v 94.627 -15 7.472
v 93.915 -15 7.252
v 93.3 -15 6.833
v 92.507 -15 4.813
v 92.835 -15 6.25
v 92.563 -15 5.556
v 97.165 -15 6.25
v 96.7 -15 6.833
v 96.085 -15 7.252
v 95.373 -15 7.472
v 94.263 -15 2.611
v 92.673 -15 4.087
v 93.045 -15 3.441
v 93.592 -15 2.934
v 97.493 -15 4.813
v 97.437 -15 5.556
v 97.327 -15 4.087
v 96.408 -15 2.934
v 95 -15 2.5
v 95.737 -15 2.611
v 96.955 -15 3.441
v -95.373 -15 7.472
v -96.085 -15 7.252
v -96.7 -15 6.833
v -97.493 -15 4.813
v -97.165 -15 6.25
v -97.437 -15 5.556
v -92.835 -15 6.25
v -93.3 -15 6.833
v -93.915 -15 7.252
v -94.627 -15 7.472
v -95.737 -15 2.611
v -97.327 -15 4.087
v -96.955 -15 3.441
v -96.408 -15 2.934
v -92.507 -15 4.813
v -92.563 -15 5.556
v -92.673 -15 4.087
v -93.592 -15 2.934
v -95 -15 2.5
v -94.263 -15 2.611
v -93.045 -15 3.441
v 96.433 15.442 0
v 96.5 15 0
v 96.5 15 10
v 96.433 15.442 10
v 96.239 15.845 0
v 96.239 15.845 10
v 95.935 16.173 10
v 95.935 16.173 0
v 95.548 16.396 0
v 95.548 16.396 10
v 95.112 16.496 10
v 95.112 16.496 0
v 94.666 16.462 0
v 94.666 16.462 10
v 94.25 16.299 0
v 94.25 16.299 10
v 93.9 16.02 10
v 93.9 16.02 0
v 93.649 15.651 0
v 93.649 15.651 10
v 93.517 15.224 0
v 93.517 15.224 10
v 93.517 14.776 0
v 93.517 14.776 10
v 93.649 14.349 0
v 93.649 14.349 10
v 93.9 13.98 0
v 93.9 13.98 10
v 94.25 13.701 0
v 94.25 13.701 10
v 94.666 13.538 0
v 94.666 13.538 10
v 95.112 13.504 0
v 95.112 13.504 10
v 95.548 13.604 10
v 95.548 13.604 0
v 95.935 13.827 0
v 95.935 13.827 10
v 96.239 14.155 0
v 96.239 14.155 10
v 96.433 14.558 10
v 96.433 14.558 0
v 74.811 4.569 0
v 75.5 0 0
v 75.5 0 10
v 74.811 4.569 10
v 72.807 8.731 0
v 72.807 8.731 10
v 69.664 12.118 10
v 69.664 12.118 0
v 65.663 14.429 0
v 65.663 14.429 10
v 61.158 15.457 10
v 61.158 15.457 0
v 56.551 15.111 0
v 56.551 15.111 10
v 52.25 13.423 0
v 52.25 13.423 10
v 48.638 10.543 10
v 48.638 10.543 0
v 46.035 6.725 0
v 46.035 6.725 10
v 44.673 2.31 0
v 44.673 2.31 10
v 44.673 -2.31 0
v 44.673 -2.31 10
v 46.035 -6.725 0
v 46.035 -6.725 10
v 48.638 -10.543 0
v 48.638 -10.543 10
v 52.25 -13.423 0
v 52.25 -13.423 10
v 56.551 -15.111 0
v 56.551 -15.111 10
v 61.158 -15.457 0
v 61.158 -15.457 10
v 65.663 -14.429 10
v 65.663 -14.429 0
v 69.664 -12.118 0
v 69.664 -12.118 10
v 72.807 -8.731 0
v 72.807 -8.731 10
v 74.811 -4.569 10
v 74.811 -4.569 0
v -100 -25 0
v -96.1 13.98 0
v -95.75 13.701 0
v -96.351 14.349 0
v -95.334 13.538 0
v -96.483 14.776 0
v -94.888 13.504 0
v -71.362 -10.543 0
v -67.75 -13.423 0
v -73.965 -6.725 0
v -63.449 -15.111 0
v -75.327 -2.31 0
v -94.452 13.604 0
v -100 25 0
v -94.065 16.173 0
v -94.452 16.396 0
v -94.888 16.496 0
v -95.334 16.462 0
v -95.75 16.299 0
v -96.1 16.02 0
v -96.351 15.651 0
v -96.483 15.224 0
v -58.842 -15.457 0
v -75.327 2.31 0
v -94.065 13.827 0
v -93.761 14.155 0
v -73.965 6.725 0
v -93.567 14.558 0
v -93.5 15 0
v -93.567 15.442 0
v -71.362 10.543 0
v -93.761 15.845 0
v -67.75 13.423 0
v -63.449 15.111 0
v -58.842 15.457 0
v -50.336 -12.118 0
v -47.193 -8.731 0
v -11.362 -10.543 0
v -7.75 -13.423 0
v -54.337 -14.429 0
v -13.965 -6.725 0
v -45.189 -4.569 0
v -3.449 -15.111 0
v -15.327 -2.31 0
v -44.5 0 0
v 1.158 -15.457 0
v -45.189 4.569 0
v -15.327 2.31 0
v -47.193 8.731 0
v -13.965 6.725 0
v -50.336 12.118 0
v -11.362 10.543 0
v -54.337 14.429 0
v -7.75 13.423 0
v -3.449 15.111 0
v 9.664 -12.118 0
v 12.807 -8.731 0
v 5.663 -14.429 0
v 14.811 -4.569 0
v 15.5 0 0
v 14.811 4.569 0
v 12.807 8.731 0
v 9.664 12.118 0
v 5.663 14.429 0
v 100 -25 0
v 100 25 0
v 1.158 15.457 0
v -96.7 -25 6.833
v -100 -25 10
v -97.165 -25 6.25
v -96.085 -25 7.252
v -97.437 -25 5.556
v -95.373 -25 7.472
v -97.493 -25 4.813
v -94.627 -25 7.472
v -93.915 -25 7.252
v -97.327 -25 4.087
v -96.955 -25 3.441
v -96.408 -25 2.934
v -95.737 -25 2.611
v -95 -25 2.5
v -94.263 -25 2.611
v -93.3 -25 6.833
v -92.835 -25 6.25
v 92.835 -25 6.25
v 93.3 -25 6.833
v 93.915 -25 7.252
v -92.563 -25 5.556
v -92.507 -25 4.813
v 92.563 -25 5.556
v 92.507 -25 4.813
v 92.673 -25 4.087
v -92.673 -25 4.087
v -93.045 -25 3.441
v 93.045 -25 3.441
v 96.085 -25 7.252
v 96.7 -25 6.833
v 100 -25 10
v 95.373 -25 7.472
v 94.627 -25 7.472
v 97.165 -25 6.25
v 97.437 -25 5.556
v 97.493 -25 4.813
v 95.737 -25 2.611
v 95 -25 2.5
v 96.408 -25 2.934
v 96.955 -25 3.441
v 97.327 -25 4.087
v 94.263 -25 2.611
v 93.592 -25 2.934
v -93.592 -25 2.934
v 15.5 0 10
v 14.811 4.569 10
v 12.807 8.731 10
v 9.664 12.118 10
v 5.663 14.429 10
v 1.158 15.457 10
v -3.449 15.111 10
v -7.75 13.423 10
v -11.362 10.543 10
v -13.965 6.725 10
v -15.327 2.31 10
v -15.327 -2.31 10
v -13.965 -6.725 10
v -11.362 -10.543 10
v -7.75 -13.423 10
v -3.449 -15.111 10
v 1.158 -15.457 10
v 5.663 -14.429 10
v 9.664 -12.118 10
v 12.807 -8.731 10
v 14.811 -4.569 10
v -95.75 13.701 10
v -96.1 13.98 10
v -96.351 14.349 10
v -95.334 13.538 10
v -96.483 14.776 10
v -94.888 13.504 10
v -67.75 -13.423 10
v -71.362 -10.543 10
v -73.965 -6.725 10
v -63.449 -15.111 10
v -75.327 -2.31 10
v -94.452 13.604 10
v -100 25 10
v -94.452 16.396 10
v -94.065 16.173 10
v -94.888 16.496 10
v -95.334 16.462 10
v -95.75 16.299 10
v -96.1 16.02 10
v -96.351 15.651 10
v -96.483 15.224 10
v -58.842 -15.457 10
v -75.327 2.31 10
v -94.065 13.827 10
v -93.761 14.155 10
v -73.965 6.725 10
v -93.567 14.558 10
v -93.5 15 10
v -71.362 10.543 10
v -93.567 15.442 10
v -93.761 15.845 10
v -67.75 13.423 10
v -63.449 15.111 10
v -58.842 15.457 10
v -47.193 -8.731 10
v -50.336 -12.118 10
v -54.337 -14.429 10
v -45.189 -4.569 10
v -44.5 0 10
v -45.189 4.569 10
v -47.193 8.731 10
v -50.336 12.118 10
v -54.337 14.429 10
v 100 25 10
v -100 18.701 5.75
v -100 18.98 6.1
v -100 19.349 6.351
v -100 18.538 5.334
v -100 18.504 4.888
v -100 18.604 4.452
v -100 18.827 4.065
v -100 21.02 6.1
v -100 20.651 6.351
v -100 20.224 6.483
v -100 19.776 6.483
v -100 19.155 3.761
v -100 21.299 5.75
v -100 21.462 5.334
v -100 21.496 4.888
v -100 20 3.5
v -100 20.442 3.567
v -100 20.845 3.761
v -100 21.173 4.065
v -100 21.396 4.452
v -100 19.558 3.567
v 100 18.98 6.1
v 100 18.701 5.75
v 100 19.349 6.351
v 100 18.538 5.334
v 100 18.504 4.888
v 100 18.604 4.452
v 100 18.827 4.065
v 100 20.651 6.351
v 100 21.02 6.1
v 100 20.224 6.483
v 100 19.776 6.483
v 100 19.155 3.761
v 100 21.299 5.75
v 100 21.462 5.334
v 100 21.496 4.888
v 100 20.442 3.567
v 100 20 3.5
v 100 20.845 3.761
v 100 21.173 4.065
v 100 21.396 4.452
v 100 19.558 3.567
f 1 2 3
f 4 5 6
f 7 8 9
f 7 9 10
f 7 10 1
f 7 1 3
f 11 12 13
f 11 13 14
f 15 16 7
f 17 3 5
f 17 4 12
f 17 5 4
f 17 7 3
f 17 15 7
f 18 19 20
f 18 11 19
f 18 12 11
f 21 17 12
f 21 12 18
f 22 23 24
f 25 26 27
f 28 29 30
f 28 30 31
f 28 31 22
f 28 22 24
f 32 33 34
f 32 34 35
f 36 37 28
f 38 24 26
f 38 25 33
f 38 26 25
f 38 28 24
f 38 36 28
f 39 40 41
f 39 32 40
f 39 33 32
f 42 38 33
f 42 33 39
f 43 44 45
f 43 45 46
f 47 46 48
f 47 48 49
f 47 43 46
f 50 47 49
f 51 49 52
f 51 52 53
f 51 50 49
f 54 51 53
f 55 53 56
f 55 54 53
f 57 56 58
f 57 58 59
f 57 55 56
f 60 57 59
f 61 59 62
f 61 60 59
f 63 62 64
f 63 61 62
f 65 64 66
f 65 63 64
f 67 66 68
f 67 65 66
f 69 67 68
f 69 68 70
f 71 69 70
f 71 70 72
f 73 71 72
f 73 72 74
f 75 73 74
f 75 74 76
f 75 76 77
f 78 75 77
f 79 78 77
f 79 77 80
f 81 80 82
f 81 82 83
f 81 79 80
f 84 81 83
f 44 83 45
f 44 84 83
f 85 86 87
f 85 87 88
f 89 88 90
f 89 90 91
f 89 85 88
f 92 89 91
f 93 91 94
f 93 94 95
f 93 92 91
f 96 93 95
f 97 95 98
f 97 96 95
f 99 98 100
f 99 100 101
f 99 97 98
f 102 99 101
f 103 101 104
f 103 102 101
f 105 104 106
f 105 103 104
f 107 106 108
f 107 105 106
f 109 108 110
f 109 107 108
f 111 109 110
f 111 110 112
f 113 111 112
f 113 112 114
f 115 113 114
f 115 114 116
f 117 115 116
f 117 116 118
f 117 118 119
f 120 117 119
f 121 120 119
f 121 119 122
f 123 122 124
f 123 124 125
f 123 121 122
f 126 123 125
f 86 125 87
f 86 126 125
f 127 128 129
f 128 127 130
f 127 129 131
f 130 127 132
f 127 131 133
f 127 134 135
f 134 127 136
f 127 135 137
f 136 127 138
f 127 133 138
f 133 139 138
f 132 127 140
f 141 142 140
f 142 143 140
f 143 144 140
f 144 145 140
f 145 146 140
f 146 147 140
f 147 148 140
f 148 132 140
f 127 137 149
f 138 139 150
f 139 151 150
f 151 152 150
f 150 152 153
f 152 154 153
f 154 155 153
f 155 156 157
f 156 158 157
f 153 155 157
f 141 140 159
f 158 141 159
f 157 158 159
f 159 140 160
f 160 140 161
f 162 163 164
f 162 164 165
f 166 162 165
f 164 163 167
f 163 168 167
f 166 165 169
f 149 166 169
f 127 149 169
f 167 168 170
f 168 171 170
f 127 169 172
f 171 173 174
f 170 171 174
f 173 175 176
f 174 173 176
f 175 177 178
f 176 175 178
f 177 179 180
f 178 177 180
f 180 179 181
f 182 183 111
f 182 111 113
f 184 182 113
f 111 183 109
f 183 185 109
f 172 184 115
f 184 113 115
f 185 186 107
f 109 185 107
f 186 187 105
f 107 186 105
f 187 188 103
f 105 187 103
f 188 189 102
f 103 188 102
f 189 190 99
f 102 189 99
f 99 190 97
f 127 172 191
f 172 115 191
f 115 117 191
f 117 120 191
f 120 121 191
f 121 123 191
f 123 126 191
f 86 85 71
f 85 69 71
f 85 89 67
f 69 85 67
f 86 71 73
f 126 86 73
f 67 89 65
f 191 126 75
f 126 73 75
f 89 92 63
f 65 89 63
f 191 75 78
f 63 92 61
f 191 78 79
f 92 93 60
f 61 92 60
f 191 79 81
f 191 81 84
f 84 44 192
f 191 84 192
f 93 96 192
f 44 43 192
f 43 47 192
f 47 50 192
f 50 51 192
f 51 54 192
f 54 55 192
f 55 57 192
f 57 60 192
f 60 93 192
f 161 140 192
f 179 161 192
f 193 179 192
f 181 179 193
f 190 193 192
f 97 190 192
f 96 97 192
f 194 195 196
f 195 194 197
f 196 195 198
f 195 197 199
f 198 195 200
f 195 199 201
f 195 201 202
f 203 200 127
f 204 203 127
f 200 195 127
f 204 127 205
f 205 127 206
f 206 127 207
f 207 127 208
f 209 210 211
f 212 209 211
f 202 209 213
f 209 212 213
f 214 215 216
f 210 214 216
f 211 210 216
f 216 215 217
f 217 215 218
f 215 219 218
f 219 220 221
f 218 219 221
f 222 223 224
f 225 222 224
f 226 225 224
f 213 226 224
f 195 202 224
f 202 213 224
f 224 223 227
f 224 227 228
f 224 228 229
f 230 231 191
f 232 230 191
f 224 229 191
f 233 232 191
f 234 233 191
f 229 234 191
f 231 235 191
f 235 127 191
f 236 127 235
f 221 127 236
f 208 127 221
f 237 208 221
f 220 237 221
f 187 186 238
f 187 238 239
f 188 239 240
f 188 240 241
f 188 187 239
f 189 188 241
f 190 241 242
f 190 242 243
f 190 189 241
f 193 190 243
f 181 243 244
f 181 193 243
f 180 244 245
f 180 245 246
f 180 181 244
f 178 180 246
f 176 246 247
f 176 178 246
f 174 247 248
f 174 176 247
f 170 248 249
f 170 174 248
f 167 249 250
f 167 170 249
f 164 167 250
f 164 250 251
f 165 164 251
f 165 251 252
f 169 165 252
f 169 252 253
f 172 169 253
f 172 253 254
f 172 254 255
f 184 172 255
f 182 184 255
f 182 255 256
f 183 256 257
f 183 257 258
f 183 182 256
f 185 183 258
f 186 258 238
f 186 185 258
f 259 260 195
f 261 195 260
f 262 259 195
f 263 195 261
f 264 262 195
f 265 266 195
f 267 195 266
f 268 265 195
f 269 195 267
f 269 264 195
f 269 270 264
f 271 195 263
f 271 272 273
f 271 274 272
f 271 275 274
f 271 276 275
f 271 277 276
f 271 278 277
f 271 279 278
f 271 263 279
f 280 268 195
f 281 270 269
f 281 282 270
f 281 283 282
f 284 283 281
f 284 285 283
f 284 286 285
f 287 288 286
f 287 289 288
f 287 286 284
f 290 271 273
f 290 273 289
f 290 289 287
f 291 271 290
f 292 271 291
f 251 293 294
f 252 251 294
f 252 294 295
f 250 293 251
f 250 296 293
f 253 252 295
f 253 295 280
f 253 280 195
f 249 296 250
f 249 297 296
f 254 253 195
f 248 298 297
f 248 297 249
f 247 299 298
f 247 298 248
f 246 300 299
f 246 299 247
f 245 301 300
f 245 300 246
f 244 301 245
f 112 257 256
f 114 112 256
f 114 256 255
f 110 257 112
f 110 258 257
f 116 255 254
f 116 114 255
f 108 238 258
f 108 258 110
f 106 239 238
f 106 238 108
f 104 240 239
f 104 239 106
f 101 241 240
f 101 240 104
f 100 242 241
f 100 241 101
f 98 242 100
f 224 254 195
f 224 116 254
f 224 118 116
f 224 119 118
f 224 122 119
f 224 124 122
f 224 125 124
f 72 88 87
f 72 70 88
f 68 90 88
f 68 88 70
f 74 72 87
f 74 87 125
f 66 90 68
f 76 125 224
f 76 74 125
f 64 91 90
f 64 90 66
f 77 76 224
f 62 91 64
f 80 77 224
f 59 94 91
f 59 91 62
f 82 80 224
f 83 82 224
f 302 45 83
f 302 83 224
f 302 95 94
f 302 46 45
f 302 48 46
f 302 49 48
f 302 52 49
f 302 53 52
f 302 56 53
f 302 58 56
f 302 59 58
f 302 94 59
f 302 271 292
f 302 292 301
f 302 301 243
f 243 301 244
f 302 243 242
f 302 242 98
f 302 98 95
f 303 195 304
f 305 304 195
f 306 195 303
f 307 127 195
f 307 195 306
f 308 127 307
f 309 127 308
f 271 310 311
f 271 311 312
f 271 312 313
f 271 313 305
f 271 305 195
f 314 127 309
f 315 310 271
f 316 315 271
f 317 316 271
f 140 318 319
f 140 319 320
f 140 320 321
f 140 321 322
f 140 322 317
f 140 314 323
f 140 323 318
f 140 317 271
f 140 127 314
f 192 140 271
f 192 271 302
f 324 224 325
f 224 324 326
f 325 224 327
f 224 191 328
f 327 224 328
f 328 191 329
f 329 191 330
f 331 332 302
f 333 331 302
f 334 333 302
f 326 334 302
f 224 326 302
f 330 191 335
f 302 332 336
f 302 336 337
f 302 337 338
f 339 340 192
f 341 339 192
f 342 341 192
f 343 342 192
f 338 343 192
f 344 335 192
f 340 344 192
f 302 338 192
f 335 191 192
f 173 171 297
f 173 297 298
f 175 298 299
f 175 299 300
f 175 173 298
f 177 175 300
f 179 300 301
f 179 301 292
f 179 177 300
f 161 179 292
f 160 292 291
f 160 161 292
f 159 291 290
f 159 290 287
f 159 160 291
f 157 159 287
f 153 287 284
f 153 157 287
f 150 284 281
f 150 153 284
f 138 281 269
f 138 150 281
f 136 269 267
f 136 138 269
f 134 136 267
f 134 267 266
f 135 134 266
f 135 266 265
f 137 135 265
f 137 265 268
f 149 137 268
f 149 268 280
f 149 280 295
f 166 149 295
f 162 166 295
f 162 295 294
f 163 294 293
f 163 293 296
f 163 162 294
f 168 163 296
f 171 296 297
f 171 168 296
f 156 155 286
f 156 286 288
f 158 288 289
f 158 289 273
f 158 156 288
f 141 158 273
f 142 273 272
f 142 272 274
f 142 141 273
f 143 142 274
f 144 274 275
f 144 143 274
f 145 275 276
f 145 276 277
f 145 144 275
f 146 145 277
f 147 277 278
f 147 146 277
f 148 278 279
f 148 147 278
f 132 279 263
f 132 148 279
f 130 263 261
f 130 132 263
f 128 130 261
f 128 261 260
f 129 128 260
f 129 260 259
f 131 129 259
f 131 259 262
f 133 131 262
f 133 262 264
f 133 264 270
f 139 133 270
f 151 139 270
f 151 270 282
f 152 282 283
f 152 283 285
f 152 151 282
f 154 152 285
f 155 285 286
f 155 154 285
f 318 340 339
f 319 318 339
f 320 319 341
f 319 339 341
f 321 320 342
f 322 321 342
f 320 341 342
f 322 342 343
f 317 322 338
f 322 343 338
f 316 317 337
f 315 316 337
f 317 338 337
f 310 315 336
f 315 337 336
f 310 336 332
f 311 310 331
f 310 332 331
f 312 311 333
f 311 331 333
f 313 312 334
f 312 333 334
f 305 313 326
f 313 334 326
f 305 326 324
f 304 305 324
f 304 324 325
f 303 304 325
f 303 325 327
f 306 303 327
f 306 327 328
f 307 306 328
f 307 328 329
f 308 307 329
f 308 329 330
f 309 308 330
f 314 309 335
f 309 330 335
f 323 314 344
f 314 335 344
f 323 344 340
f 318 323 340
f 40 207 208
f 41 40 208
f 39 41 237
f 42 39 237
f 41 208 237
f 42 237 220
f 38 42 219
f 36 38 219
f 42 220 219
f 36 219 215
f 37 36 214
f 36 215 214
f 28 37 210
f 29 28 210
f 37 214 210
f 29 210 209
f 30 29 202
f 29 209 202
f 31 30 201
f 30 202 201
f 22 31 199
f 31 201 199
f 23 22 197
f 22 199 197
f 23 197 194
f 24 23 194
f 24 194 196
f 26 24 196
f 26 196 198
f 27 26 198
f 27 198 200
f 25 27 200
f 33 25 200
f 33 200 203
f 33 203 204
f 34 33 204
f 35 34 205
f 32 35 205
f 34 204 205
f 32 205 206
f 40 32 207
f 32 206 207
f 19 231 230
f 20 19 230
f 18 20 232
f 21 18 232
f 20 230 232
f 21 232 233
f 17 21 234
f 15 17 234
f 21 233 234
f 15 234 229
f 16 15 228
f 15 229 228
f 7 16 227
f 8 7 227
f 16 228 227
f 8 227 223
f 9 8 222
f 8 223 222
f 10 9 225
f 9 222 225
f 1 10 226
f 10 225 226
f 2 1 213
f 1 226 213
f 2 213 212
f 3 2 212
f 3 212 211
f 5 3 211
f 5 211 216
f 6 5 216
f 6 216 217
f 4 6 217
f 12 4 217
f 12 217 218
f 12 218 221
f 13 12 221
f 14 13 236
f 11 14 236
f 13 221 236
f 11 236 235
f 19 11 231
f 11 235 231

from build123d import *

# Parameters (mm, degrees)
SKETCH1_W           = 200
SKETCH1_H           = 50
SKETCH1_R           = 15.5
SKETCH1_R_2         = 1.5
BOSS_EXTRUDE1_DEPTH = 10
SKETCH2_R           = 2.5
CUT_EXTRUDE1_DEPTH  = 10
SKETCH3_R           = 1.5
CUT_EXTRUDE2_DEPTH  = 200


with BuildPart() as part:
    # Sketch1 → Boss-Extrude1 (new body)
    with BuildSketch(Plane.XY):
        Rectangle(SKETCH1_W, SKETCH1_H)
        Circle(SKETCH1_R, mode=Mode.SUBTRACT)
        with Locations((60, 0)):
            Circle(SKETCH1_R, mode=Mode.SUBTRACT)
        with Locations((-60, 0)):
            Circle(SKETCH1_R, mode=Mode.SUBTRACT)
        with Locations((95, 15)):
            Circle(SKETCH1_R_2, mode=Mode.SUBTRACT)
        with Locations((-95, 15)):
            Circle(SKETCH1_R_2, mode=Mode.SUBTRACT)
    extrude(amount=BOSS_EXTRUDE1_DEPTH)

    # Sketch2 → Cut-Extrude1 (cut)
    with BuildSketch(Plane.XZ.offset(25)):
        with Locations(Location((-95, 5, 0), (0, 0, 270))):
            Circle(SKETCH2_R)
        with Locations(Location((95, 5, 0), (0, 0, 270))):
            Circle(SKETCH2_R)
    extrude(amount=-CUT_EXTRUDE1_DEPTH, mode=Mode.SUBTRACT)

    # Sketch3 → Cut-Extrude2 (cut)
    with BuildSketch(Plane(origin=(100, 0, 0), x_dir=(0, 0, -1), z_dir=(1, 0, 0))):
        with Locations((-5, 20)):
            Circle(SKETCH3_R)
    extrude(amount=-CUT_EXTRUDE2_DEPTH, mode=Mode.SUBTRACT)


solid = part.part
